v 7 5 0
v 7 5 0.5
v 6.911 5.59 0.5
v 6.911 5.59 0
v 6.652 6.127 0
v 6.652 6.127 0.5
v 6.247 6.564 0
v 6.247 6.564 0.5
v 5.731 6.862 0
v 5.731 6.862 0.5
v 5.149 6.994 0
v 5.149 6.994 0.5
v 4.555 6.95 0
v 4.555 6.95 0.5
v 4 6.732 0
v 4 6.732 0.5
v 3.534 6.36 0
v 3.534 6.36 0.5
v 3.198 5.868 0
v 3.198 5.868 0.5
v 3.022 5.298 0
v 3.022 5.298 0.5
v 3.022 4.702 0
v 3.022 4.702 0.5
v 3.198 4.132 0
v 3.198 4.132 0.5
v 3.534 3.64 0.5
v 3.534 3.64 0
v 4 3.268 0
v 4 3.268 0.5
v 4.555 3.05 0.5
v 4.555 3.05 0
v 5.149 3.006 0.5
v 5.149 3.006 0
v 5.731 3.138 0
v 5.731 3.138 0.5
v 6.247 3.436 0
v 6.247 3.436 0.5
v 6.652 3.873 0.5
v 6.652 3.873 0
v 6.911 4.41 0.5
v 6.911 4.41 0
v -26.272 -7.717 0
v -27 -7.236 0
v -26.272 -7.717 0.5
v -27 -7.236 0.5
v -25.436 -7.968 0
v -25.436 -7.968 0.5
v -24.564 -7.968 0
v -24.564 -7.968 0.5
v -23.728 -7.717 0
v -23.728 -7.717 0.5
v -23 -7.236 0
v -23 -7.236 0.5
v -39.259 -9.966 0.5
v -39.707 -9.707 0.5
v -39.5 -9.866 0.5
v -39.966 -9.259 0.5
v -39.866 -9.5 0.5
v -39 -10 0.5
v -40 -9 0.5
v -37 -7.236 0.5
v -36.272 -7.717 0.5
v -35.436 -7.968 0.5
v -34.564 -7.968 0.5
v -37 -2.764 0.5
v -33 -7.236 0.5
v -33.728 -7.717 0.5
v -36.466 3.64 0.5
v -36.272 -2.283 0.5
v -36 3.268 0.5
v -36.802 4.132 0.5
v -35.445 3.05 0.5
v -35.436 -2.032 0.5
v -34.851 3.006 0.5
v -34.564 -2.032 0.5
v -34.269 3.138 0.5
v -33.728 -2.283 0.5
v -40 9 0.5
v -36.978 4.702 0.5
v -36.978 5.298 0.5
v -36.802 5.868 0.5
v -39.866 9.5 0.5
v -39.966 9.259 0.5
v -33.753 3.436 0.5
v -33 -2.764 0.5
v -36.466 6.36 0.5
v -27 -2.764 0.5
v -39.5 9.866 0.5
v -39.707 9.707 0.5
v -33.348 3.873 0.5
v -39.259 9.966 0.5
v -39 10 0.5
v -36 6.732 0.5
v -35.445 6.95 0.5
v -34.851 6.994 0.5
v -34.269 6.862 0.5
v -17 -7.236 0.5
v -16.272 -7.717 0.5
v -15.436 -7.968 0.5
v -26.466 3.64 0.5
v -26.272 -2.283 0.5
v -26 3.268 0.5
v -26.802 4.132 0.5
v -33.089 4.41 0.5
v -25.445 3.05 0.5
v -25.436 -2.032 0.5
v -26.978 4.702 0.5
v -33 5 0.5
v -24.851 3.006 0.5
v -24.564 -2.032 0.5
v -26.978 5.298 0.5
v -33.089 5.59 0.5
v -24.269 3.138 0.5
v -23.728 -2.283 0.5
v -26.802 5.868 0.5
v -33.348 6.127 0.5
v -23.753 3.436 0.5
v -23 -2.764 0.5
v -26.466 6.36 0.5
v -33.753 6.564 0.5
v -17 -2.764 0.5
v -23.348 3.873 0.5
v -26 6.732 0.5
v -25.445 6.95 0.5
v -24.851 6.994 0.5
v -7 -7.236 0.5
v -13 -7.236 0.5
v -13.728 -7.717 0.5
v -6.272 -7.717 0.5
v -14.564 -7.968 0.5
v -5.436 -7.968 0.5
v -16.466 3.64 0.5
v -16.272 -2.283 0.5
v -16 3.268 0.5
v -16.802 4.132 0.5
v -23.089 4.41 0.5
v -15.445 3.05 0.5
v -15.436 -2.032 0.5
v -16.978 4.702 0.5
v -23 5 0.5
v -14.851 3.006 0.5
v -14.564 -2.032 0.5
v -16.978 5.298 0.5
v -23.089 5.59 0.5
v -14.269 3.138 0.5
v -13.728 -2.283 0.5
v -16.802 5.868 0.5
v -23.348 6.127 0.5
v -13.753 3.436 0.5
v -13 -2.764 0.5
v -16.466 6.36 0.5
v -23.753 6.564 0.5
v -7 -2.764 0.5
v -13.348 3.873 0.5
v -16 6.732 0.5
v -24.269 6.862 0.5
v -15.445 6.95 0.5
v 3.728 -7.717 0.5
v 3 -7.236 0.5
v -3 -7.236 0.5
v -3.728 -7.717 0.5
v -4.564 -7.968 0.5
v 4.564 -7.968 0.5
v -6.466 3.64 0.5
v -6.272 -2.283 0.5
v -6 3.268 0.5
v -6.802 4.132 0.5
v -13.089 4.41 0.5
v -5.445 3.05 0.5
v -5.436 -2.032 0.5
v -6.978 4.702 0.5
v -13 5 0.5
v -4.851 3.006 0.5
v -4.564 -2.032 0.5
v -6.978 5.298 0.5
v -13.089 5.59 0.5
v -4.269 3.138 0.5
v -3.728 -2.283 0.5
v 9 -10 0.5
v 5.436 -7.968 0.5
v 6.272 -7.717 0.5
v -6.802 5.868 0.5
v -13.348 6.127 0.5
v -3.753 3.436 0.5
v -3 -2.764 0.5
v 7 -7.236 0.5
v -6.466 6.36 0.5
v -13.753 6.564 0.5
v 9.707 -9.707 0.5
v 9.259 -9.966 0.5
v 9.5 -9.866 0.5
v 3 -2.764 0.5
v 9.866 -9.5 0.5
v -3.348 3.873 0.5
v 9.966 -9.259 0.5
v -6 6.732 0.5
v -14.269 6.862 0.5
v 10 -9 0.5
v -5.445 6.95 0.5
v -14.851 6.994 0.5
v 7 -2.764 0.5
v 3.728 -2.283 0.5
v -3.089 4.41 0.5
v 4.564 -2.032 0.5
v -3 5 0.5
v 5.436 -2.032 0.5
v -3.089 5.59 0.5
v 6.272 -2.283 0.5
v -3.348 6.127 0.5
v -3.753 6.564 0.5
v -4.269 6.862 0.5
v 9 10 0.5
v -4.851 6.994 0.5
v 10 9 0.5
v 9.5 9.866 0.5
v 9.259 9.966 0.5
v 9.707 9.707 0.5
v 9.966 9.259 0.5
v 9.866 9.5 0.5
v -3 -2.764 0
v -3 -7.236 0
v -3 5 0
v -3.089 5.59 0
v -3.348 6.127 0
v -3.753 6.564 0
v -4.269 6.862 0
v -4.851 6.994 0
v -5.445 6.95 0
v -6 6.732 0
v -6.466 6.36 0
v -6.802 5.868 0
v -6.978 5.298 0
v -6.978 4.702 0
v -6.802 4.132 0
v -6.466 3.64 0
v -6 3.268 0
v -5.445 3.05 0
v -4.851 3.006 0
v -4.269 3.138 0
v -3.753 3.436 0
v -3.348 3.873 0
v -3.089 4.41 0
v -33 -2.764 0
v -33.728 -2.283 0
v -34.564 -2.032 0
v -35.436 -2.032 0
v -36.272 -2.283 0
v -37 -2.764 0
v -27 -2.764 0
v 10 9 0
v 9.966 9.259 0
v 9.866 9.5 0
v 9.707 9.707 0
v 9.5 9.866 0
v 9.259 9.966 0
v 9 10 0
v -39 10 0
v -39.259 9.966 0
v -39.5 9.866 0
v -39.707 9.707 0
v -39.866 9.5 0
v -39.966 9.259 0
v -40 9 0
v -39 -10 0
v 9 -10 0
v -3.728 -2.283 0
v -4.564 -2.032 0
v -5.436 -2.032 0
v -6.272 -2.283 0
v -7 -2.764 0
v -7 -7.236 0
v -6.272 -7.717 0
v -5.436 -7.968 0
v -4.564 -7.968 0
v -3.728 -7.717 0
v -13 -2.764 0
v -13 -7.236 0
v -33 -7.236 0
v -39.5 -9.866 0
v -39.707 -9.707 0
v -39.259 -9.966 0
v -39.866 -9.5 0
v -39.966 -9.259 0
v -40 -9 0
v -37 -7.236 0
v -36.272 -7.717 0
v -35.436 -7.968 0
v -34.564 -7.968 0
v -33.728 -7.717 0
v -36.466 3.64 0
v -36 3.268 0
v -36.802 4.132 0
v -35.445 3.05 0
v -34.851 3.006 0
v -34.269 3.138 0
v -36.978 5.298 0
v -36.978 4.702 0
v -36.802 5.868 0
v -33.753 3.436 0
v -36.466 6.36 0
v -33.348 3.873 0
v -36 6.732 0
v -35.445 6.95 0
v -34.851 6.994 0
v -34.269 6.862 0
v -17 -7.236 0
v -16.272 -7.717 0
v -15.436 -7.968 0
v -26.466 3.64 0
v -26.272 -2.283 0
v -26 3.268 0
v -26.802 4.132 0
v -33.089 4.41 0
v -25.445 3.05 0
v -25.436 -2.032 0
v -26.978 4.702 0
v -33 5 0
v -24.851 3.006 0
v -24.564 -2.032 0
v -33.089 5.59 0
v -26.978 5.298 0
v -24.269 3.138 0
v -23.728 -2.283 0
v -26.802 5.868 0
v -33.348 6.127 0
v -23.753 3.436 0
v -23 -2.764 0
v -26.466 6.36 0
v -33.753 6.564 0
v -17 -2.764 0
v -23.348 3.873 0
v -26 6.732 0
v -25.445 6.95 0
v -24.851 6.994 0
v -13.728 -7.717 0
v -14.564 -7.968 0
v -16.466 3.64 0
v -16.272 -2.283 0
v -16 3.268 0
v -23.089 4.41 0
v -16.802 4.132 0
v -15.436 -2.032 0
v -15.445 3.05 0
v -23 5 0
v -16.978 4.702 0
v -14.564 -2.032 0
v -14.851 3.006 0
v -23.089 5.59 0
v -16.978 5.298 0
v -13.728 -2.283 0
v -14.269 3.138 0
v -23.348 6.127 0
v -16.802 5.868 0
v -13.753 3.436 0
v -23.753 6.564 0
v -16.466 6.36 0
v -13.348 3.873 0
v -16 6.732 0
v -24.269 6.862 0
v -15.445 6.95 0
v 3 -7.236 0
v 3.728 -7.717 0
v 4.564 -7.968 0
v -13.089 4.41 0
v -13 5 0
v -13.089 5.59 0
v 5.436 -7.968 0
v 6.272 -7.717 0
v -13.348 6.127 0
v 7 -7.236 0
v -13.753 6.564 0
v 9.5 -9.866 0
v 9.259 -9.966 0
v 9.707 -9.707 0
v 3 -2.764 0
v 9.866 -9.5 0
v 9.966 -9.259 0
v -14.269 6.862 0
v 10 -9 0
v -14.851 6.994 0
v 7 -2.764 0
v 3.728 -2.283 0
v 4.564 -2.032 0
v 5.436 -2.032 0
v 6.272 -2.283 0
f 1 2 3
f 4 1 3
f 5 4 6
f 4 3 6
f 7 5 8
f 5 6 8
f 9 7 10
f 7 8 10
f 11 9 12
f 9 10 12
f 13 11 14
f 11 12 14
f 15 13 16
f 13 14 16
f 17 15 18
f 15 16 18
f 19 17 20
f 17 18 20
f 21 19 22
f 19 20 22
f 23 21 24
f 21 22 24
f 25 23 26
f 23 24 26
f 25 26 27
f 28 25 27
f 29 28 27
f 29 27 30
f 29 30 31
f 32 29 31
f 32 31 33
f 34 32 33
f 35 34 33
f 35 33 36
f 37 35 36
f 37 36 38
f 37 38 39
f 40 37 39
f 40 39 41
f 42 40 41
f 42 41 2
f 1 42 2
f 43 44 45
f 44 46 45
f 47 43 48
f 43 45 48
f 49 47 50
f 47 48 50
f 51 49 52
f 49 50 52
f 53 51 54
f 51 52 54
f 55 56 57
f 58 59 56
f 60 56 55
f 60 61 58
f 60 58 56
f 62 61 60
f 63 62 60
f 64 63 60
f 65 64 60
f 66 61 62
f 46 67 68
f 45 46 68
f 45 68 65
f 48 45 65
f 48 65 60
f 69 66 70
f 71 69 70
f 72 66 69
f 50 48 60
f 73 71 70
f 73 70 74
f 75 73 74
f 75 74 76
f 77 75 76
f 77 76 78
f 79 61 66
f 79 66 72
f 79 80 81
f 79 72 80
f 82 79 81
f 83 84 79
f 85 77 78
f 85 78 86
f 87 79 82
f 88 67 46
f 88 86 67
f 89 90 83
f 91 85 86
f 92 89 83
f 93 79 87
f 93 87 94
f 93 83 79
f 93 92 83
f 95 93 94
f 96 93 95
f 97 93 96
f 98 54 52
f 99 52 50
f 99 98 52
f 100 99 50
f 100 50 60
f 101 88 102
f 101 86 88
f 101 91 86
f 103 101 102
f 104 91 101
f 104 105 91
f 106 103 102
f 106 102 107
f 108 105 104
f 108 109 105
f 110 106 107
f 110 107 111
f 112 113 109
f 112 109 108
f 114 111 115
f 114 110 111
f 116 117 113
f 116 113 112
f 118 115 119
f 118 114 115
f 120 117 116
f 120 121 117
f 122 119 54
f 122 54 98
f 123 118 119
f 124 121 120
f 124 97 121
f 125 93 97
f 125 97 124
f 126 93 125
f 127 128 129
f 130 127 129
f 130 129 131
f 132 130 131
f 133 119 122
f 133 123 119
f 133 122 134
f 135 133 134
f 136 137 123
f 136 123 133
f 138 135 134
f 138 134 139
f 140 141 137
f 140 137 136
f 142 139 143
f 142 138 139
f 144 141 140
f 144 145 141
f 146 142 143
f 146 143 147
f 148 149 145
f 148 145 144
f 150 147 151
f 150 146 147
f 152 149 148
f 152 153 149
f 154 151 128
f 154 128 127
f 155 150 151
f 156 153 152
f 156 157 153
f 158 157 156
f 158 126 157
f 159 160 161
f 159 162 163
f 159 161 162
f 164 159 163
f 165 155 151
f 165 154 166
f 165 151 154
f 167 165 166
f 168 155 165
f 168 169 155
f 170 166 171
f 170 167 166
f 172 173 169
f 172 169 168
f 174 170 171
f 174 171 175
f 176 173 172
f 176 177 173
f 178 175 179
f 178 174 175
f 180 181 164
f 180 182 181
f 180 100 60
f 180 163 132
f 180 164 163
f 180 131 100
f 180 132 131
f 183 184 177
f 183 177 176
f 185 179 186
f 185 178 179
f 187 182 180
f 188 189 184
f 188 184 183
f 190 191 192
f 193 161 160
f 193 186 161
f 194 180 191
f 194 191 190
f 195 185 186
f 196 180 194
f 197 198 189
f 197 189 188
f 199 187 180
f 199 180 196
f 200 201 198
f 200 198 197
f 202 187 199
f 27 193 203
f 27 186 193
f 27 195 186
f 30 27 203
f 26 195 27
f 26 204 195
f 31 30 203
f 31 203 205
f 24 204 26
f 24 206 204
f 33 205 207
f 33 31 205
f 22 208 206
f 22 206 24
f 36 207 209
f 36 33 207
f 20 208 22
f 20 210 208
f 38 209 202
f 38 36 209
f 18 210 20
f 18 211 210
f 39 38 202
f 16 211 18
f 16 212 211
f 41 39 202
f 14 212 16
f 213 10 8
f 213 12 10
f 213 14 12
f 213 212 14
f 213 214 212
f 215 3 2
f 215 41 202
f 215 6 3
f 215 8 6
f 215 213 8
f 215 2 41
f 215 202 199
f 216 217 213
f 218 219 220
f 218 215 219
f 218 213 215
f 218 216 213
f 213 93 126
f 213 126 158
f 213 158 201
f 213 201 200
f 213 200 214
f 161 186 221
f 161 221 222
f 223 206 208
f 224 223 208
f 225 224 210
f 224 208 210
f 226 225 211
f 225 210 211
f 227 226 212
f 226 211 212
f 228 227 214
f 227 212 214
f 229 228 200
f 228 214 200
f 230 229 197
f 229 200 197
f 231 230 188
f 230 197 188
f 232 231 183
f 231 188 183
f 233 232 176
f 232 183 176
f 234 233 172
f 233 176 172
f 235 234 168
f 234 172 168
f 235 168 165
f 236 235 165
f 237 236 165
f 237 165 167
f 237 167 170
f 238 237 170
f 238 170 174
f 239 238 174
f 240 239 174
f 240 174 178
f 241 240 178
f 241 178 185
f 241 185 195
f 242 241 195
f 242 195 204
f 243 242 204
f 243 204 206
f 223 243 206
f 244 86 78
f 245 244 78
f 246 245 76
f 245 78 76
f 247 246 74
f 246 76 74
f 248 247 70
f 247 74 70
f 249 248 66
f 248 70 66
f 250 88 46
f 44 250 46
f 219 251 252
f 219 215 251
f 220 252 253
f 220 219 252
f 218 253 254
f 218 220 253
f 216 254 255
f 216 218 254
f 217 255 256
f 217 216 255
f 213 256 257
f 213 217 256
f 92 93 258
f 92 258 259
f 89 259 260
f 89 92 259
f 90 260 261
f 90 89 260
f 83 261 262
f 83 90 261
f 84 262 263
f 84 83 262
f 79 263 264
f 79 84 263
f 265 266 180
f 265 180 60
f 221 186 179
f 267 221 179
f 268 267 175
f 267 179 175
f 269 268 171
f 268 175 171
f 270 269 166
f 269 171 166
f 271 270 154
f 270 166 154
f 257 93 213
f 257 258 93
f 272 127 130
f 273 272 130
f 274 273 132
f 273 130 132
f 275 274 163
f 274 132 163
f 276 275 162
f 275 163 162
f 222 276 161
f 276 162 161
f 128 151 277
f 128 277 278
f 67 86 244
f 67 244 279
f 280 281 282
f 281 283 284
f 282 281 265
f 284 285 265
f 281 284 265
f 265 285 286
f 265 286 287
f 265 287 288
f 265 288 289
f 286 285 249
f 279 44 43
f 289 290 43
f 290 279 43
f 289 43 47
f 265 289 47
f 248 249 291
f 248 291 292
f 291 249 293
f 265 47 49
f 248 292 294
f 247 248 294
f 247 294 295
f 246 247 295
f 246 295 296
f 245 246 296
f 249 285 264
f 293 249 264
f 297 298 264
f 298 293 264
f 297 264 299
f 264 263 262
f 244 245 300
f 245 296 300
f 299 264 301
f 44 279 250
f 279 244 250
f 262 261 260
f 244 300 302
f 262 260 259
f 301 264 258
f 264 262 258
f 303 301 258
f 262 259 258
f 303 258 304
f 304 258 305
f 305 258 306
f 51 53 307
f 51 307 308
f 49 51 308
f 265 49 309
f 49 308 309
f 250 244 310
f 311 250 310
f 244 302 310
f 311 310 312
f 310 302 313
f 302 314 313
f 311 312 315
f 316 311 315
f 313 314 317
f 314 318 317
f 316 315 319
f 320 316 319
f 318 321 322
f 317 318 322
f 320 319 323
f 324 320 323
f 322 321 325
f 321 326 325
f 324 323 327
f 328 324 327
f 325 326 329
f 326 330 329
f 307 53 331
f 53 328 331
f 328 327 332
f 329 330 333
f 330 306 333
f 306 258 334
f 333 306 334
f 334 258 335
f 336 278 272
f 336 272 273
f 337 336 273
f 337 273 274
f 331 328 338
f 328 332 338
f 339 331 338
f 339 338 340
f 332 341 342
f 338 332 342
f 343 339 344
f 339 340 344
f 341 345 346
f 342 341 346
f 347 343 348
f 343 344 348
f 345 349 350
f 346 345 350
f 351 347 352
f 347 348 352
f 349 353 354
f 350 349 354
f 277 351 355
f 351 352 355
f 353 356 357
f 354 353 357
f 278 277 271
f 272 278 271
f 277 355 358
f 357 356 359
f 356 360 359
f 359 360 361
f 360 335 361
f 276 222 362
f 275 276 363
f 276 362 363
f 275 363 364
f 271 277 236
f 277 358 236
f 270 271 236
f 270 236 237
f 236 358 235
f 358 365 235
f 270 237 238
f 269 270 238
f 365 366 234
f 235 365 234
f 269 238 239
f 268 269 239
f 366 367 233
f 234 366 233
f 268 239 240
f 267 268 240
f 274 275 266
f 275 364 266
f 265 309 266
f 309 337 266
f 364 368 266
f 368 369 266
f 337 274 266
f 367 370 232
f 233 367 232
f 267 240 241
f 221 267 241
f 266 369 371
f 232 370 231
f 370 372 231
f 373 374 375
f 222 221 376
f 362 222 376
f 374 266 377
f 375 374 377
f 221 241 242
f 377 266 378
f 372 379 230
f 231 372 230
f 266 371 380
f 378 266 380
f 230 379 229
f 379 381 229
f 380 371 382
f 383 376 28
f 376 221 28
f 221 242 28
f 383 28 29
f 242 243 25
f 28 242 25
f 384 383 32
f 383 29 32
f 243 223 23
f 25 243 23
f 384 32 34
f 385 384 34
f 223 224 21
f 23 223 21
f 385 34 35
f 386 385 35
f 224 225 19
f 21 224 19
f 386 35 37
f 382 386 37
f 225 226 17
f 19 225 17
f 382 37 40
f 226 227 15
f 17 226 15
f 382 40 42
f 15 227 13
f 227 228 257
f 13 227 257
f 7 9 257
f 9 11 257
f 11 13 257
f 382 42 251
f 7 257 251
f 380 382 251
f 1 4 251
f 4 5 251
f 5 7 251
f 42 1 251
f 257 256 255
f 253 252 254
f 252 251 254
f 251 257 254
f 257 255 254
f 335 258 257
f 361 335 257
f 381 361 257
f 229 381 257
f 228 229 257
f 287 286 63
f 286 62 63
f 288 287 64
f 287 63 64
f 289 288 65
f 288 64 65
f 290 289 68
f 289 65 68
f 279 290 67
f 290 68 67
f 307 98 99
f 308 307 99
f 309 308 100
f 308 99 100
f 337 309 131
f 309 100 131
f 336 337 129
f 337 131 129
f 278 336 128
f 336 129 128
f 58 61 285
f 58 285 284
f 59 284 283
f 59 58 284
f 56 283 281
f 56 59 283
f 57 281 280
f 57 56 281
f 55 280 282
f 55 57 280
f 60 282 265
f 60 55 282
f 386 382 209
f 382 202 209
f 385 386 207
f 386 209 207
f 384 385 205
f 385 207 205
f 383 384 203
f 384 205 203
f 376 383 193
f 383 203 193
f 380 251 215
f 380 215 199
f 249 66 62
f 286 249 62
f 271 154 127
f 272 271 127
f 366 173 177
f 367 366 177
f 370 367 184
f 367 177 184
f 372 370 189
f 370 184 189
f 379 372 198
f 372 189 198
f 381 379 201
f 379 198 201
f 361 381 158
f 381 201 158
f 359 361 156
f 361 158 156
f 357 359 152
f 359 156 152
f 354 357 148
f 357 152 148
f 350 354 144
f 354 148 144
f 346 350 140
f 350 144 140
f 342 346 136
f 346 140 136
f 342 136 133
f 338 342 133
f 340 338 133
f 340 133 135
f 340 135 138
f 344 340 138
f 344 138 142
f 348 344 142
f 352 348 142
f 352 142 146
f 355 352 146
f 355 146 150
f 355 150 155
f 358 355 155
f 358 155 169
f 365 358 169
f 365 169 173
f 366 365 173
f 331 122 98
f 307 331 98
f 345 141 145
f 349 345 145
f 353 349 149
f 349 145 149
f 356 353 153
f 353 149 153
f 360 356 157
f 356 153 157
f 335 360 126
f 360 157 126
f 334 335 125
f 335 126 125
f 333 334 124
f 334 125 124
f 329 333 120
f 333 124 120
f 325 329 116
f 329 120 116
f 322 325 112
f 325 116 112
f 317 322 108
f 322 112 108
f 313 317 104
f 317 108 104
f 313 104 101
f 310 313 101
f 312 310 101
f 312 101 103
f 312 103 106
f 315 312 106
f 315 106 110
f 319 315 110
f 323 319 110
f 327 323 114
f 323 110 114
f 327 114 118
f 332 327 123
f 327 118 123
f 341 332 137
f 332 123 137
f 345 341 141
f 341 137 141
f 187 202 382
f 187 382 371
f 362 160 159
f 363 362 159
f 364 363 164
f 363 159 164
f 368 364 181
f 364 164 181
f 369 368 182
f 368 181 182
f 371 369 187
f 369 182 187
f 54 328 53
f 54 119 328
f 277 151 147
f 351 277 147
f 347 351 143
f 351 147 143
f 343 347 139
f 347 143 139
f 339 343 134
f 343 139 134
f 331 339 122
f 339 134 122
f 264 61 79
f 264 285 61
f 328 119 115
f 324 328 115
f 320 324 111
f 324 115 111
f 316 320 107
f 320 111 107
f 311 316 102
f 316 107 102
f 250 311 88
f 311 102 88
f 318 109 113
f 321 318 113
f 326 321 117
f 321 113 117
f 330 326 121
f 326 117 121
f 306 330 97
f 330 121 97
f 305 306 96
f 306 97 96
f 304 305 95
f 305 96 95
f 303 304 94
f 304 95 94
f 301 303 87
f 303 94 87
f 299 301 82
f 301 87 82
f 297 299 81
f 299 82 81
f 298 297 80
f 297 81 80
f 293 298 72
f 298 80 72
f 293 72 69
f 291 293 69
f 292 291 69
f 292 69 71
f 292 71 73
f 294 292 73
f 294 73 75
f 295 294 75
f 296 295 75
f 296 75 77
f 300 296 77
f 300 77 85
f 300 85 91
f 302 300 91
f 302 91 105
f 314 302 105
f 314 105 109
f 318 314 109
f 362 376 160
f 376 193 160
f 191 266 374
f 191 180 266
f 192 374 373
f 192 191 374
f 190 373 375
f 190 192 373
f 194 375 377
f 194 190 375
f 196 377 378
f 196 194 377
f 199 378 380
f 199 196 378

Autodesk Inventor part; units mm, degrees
ref_plane "YZ Plane" through (0, 0, 0) normal (1, 0, 0) x (0, 1, 0)
ref_plane "XZ Plane" through (0, 0, 0) normal (0, 1, 0) x (-1, 0, 0)
ref_plane "XY Plane" through (0, 0, 0) normal (0, 0, 1) x (1, 0, 0)
sketch "Náčrt1" plane through (0, 0, 0) normal (0, 0, 1) x (1, 0, 0)
  line L0 (-40, 10) -> (10, 10)
  line L1 (10, 10) -> (10, -10)
  line L2 (10, -10) -> (-40, -10)
  line L3 (-40, -10) -> (-40, 10)
  point P0 (0, 0)
  dimension "d0" = 20
  dimension "d1" = 50
  dimension "d2" = 10
  dimension "d3" = 10
extrude "Vysunutí1" add sketch "Náčrt1" along normal blind 0.5
sketch "Náčrt2" plane through (0, 0, 0.5) normal (0, 0, 1) x (1, 0, 0)
  circle A0 centre (-35, 5) radius 2
  line L0 (10, 10) -> (-40, 10) projected
  line L1 (-40, 10) -> (-40, -10) projected
  point P0 (0, 0)
  dimension "d6" = 4
  dimension "d7" = 5
  dimension "d8" = 5
extrude "Vysunutí2" cut sketch "Náčrt2" against normal blind 0.5
pattern_linear "Obdélníkové pole1" count 7 spacing 10 along (1, 0, 0) of "Vysunutí2"
fillet "Zaoblení1" radius 1 1 edges at (10, 10, 0.25)
fillet "Zaoblení2" radius 1 2 edges at (-40, 10, 0.25) (-40, -10, 0.25)
fillet "Zaoblení3" radius 1 1 edges at (10, -10, 0.25)
sketch "Náčrt3" plane through (0, 0, 0.5) normal (0, 0, 1) x (1, 0, 0)
  line L0 (7, -2.7639) -> (7, -7.2361)
  line L1 (3, -2.7639) -> (3, -7.2361)
  arc A0 (7, -2.7639) -> (3, -2.7639) centre (5, -5) ccw
  arc A1 (3, -7.2361) -> (7, -7.2361) centre (5, -5) ccw
  line L2 (10, -9) -> (10, 9) projected
  line L3 (-39, -10) -> (9, -10) projected
  point P0 (0, 0)
  point P1 (3, -7.229)
  point P2 (5, -8)
  point P3 (5, -2)
  dimension "d24" = 2
  dimension "d25" = 4
  dimension "d26" = 5
  dimension "d27" = 5
  dimension "d28" = 3
  dimension "d29" = 3
extrude "Vysunutí3" cut sketch "Náčrt3" against normal blind 10
pattern_linear "Obdélníkové pole2" count 7 spacing 10 along (-1, 0, 0) of "Vysunutí3"
properties part number "1020"
